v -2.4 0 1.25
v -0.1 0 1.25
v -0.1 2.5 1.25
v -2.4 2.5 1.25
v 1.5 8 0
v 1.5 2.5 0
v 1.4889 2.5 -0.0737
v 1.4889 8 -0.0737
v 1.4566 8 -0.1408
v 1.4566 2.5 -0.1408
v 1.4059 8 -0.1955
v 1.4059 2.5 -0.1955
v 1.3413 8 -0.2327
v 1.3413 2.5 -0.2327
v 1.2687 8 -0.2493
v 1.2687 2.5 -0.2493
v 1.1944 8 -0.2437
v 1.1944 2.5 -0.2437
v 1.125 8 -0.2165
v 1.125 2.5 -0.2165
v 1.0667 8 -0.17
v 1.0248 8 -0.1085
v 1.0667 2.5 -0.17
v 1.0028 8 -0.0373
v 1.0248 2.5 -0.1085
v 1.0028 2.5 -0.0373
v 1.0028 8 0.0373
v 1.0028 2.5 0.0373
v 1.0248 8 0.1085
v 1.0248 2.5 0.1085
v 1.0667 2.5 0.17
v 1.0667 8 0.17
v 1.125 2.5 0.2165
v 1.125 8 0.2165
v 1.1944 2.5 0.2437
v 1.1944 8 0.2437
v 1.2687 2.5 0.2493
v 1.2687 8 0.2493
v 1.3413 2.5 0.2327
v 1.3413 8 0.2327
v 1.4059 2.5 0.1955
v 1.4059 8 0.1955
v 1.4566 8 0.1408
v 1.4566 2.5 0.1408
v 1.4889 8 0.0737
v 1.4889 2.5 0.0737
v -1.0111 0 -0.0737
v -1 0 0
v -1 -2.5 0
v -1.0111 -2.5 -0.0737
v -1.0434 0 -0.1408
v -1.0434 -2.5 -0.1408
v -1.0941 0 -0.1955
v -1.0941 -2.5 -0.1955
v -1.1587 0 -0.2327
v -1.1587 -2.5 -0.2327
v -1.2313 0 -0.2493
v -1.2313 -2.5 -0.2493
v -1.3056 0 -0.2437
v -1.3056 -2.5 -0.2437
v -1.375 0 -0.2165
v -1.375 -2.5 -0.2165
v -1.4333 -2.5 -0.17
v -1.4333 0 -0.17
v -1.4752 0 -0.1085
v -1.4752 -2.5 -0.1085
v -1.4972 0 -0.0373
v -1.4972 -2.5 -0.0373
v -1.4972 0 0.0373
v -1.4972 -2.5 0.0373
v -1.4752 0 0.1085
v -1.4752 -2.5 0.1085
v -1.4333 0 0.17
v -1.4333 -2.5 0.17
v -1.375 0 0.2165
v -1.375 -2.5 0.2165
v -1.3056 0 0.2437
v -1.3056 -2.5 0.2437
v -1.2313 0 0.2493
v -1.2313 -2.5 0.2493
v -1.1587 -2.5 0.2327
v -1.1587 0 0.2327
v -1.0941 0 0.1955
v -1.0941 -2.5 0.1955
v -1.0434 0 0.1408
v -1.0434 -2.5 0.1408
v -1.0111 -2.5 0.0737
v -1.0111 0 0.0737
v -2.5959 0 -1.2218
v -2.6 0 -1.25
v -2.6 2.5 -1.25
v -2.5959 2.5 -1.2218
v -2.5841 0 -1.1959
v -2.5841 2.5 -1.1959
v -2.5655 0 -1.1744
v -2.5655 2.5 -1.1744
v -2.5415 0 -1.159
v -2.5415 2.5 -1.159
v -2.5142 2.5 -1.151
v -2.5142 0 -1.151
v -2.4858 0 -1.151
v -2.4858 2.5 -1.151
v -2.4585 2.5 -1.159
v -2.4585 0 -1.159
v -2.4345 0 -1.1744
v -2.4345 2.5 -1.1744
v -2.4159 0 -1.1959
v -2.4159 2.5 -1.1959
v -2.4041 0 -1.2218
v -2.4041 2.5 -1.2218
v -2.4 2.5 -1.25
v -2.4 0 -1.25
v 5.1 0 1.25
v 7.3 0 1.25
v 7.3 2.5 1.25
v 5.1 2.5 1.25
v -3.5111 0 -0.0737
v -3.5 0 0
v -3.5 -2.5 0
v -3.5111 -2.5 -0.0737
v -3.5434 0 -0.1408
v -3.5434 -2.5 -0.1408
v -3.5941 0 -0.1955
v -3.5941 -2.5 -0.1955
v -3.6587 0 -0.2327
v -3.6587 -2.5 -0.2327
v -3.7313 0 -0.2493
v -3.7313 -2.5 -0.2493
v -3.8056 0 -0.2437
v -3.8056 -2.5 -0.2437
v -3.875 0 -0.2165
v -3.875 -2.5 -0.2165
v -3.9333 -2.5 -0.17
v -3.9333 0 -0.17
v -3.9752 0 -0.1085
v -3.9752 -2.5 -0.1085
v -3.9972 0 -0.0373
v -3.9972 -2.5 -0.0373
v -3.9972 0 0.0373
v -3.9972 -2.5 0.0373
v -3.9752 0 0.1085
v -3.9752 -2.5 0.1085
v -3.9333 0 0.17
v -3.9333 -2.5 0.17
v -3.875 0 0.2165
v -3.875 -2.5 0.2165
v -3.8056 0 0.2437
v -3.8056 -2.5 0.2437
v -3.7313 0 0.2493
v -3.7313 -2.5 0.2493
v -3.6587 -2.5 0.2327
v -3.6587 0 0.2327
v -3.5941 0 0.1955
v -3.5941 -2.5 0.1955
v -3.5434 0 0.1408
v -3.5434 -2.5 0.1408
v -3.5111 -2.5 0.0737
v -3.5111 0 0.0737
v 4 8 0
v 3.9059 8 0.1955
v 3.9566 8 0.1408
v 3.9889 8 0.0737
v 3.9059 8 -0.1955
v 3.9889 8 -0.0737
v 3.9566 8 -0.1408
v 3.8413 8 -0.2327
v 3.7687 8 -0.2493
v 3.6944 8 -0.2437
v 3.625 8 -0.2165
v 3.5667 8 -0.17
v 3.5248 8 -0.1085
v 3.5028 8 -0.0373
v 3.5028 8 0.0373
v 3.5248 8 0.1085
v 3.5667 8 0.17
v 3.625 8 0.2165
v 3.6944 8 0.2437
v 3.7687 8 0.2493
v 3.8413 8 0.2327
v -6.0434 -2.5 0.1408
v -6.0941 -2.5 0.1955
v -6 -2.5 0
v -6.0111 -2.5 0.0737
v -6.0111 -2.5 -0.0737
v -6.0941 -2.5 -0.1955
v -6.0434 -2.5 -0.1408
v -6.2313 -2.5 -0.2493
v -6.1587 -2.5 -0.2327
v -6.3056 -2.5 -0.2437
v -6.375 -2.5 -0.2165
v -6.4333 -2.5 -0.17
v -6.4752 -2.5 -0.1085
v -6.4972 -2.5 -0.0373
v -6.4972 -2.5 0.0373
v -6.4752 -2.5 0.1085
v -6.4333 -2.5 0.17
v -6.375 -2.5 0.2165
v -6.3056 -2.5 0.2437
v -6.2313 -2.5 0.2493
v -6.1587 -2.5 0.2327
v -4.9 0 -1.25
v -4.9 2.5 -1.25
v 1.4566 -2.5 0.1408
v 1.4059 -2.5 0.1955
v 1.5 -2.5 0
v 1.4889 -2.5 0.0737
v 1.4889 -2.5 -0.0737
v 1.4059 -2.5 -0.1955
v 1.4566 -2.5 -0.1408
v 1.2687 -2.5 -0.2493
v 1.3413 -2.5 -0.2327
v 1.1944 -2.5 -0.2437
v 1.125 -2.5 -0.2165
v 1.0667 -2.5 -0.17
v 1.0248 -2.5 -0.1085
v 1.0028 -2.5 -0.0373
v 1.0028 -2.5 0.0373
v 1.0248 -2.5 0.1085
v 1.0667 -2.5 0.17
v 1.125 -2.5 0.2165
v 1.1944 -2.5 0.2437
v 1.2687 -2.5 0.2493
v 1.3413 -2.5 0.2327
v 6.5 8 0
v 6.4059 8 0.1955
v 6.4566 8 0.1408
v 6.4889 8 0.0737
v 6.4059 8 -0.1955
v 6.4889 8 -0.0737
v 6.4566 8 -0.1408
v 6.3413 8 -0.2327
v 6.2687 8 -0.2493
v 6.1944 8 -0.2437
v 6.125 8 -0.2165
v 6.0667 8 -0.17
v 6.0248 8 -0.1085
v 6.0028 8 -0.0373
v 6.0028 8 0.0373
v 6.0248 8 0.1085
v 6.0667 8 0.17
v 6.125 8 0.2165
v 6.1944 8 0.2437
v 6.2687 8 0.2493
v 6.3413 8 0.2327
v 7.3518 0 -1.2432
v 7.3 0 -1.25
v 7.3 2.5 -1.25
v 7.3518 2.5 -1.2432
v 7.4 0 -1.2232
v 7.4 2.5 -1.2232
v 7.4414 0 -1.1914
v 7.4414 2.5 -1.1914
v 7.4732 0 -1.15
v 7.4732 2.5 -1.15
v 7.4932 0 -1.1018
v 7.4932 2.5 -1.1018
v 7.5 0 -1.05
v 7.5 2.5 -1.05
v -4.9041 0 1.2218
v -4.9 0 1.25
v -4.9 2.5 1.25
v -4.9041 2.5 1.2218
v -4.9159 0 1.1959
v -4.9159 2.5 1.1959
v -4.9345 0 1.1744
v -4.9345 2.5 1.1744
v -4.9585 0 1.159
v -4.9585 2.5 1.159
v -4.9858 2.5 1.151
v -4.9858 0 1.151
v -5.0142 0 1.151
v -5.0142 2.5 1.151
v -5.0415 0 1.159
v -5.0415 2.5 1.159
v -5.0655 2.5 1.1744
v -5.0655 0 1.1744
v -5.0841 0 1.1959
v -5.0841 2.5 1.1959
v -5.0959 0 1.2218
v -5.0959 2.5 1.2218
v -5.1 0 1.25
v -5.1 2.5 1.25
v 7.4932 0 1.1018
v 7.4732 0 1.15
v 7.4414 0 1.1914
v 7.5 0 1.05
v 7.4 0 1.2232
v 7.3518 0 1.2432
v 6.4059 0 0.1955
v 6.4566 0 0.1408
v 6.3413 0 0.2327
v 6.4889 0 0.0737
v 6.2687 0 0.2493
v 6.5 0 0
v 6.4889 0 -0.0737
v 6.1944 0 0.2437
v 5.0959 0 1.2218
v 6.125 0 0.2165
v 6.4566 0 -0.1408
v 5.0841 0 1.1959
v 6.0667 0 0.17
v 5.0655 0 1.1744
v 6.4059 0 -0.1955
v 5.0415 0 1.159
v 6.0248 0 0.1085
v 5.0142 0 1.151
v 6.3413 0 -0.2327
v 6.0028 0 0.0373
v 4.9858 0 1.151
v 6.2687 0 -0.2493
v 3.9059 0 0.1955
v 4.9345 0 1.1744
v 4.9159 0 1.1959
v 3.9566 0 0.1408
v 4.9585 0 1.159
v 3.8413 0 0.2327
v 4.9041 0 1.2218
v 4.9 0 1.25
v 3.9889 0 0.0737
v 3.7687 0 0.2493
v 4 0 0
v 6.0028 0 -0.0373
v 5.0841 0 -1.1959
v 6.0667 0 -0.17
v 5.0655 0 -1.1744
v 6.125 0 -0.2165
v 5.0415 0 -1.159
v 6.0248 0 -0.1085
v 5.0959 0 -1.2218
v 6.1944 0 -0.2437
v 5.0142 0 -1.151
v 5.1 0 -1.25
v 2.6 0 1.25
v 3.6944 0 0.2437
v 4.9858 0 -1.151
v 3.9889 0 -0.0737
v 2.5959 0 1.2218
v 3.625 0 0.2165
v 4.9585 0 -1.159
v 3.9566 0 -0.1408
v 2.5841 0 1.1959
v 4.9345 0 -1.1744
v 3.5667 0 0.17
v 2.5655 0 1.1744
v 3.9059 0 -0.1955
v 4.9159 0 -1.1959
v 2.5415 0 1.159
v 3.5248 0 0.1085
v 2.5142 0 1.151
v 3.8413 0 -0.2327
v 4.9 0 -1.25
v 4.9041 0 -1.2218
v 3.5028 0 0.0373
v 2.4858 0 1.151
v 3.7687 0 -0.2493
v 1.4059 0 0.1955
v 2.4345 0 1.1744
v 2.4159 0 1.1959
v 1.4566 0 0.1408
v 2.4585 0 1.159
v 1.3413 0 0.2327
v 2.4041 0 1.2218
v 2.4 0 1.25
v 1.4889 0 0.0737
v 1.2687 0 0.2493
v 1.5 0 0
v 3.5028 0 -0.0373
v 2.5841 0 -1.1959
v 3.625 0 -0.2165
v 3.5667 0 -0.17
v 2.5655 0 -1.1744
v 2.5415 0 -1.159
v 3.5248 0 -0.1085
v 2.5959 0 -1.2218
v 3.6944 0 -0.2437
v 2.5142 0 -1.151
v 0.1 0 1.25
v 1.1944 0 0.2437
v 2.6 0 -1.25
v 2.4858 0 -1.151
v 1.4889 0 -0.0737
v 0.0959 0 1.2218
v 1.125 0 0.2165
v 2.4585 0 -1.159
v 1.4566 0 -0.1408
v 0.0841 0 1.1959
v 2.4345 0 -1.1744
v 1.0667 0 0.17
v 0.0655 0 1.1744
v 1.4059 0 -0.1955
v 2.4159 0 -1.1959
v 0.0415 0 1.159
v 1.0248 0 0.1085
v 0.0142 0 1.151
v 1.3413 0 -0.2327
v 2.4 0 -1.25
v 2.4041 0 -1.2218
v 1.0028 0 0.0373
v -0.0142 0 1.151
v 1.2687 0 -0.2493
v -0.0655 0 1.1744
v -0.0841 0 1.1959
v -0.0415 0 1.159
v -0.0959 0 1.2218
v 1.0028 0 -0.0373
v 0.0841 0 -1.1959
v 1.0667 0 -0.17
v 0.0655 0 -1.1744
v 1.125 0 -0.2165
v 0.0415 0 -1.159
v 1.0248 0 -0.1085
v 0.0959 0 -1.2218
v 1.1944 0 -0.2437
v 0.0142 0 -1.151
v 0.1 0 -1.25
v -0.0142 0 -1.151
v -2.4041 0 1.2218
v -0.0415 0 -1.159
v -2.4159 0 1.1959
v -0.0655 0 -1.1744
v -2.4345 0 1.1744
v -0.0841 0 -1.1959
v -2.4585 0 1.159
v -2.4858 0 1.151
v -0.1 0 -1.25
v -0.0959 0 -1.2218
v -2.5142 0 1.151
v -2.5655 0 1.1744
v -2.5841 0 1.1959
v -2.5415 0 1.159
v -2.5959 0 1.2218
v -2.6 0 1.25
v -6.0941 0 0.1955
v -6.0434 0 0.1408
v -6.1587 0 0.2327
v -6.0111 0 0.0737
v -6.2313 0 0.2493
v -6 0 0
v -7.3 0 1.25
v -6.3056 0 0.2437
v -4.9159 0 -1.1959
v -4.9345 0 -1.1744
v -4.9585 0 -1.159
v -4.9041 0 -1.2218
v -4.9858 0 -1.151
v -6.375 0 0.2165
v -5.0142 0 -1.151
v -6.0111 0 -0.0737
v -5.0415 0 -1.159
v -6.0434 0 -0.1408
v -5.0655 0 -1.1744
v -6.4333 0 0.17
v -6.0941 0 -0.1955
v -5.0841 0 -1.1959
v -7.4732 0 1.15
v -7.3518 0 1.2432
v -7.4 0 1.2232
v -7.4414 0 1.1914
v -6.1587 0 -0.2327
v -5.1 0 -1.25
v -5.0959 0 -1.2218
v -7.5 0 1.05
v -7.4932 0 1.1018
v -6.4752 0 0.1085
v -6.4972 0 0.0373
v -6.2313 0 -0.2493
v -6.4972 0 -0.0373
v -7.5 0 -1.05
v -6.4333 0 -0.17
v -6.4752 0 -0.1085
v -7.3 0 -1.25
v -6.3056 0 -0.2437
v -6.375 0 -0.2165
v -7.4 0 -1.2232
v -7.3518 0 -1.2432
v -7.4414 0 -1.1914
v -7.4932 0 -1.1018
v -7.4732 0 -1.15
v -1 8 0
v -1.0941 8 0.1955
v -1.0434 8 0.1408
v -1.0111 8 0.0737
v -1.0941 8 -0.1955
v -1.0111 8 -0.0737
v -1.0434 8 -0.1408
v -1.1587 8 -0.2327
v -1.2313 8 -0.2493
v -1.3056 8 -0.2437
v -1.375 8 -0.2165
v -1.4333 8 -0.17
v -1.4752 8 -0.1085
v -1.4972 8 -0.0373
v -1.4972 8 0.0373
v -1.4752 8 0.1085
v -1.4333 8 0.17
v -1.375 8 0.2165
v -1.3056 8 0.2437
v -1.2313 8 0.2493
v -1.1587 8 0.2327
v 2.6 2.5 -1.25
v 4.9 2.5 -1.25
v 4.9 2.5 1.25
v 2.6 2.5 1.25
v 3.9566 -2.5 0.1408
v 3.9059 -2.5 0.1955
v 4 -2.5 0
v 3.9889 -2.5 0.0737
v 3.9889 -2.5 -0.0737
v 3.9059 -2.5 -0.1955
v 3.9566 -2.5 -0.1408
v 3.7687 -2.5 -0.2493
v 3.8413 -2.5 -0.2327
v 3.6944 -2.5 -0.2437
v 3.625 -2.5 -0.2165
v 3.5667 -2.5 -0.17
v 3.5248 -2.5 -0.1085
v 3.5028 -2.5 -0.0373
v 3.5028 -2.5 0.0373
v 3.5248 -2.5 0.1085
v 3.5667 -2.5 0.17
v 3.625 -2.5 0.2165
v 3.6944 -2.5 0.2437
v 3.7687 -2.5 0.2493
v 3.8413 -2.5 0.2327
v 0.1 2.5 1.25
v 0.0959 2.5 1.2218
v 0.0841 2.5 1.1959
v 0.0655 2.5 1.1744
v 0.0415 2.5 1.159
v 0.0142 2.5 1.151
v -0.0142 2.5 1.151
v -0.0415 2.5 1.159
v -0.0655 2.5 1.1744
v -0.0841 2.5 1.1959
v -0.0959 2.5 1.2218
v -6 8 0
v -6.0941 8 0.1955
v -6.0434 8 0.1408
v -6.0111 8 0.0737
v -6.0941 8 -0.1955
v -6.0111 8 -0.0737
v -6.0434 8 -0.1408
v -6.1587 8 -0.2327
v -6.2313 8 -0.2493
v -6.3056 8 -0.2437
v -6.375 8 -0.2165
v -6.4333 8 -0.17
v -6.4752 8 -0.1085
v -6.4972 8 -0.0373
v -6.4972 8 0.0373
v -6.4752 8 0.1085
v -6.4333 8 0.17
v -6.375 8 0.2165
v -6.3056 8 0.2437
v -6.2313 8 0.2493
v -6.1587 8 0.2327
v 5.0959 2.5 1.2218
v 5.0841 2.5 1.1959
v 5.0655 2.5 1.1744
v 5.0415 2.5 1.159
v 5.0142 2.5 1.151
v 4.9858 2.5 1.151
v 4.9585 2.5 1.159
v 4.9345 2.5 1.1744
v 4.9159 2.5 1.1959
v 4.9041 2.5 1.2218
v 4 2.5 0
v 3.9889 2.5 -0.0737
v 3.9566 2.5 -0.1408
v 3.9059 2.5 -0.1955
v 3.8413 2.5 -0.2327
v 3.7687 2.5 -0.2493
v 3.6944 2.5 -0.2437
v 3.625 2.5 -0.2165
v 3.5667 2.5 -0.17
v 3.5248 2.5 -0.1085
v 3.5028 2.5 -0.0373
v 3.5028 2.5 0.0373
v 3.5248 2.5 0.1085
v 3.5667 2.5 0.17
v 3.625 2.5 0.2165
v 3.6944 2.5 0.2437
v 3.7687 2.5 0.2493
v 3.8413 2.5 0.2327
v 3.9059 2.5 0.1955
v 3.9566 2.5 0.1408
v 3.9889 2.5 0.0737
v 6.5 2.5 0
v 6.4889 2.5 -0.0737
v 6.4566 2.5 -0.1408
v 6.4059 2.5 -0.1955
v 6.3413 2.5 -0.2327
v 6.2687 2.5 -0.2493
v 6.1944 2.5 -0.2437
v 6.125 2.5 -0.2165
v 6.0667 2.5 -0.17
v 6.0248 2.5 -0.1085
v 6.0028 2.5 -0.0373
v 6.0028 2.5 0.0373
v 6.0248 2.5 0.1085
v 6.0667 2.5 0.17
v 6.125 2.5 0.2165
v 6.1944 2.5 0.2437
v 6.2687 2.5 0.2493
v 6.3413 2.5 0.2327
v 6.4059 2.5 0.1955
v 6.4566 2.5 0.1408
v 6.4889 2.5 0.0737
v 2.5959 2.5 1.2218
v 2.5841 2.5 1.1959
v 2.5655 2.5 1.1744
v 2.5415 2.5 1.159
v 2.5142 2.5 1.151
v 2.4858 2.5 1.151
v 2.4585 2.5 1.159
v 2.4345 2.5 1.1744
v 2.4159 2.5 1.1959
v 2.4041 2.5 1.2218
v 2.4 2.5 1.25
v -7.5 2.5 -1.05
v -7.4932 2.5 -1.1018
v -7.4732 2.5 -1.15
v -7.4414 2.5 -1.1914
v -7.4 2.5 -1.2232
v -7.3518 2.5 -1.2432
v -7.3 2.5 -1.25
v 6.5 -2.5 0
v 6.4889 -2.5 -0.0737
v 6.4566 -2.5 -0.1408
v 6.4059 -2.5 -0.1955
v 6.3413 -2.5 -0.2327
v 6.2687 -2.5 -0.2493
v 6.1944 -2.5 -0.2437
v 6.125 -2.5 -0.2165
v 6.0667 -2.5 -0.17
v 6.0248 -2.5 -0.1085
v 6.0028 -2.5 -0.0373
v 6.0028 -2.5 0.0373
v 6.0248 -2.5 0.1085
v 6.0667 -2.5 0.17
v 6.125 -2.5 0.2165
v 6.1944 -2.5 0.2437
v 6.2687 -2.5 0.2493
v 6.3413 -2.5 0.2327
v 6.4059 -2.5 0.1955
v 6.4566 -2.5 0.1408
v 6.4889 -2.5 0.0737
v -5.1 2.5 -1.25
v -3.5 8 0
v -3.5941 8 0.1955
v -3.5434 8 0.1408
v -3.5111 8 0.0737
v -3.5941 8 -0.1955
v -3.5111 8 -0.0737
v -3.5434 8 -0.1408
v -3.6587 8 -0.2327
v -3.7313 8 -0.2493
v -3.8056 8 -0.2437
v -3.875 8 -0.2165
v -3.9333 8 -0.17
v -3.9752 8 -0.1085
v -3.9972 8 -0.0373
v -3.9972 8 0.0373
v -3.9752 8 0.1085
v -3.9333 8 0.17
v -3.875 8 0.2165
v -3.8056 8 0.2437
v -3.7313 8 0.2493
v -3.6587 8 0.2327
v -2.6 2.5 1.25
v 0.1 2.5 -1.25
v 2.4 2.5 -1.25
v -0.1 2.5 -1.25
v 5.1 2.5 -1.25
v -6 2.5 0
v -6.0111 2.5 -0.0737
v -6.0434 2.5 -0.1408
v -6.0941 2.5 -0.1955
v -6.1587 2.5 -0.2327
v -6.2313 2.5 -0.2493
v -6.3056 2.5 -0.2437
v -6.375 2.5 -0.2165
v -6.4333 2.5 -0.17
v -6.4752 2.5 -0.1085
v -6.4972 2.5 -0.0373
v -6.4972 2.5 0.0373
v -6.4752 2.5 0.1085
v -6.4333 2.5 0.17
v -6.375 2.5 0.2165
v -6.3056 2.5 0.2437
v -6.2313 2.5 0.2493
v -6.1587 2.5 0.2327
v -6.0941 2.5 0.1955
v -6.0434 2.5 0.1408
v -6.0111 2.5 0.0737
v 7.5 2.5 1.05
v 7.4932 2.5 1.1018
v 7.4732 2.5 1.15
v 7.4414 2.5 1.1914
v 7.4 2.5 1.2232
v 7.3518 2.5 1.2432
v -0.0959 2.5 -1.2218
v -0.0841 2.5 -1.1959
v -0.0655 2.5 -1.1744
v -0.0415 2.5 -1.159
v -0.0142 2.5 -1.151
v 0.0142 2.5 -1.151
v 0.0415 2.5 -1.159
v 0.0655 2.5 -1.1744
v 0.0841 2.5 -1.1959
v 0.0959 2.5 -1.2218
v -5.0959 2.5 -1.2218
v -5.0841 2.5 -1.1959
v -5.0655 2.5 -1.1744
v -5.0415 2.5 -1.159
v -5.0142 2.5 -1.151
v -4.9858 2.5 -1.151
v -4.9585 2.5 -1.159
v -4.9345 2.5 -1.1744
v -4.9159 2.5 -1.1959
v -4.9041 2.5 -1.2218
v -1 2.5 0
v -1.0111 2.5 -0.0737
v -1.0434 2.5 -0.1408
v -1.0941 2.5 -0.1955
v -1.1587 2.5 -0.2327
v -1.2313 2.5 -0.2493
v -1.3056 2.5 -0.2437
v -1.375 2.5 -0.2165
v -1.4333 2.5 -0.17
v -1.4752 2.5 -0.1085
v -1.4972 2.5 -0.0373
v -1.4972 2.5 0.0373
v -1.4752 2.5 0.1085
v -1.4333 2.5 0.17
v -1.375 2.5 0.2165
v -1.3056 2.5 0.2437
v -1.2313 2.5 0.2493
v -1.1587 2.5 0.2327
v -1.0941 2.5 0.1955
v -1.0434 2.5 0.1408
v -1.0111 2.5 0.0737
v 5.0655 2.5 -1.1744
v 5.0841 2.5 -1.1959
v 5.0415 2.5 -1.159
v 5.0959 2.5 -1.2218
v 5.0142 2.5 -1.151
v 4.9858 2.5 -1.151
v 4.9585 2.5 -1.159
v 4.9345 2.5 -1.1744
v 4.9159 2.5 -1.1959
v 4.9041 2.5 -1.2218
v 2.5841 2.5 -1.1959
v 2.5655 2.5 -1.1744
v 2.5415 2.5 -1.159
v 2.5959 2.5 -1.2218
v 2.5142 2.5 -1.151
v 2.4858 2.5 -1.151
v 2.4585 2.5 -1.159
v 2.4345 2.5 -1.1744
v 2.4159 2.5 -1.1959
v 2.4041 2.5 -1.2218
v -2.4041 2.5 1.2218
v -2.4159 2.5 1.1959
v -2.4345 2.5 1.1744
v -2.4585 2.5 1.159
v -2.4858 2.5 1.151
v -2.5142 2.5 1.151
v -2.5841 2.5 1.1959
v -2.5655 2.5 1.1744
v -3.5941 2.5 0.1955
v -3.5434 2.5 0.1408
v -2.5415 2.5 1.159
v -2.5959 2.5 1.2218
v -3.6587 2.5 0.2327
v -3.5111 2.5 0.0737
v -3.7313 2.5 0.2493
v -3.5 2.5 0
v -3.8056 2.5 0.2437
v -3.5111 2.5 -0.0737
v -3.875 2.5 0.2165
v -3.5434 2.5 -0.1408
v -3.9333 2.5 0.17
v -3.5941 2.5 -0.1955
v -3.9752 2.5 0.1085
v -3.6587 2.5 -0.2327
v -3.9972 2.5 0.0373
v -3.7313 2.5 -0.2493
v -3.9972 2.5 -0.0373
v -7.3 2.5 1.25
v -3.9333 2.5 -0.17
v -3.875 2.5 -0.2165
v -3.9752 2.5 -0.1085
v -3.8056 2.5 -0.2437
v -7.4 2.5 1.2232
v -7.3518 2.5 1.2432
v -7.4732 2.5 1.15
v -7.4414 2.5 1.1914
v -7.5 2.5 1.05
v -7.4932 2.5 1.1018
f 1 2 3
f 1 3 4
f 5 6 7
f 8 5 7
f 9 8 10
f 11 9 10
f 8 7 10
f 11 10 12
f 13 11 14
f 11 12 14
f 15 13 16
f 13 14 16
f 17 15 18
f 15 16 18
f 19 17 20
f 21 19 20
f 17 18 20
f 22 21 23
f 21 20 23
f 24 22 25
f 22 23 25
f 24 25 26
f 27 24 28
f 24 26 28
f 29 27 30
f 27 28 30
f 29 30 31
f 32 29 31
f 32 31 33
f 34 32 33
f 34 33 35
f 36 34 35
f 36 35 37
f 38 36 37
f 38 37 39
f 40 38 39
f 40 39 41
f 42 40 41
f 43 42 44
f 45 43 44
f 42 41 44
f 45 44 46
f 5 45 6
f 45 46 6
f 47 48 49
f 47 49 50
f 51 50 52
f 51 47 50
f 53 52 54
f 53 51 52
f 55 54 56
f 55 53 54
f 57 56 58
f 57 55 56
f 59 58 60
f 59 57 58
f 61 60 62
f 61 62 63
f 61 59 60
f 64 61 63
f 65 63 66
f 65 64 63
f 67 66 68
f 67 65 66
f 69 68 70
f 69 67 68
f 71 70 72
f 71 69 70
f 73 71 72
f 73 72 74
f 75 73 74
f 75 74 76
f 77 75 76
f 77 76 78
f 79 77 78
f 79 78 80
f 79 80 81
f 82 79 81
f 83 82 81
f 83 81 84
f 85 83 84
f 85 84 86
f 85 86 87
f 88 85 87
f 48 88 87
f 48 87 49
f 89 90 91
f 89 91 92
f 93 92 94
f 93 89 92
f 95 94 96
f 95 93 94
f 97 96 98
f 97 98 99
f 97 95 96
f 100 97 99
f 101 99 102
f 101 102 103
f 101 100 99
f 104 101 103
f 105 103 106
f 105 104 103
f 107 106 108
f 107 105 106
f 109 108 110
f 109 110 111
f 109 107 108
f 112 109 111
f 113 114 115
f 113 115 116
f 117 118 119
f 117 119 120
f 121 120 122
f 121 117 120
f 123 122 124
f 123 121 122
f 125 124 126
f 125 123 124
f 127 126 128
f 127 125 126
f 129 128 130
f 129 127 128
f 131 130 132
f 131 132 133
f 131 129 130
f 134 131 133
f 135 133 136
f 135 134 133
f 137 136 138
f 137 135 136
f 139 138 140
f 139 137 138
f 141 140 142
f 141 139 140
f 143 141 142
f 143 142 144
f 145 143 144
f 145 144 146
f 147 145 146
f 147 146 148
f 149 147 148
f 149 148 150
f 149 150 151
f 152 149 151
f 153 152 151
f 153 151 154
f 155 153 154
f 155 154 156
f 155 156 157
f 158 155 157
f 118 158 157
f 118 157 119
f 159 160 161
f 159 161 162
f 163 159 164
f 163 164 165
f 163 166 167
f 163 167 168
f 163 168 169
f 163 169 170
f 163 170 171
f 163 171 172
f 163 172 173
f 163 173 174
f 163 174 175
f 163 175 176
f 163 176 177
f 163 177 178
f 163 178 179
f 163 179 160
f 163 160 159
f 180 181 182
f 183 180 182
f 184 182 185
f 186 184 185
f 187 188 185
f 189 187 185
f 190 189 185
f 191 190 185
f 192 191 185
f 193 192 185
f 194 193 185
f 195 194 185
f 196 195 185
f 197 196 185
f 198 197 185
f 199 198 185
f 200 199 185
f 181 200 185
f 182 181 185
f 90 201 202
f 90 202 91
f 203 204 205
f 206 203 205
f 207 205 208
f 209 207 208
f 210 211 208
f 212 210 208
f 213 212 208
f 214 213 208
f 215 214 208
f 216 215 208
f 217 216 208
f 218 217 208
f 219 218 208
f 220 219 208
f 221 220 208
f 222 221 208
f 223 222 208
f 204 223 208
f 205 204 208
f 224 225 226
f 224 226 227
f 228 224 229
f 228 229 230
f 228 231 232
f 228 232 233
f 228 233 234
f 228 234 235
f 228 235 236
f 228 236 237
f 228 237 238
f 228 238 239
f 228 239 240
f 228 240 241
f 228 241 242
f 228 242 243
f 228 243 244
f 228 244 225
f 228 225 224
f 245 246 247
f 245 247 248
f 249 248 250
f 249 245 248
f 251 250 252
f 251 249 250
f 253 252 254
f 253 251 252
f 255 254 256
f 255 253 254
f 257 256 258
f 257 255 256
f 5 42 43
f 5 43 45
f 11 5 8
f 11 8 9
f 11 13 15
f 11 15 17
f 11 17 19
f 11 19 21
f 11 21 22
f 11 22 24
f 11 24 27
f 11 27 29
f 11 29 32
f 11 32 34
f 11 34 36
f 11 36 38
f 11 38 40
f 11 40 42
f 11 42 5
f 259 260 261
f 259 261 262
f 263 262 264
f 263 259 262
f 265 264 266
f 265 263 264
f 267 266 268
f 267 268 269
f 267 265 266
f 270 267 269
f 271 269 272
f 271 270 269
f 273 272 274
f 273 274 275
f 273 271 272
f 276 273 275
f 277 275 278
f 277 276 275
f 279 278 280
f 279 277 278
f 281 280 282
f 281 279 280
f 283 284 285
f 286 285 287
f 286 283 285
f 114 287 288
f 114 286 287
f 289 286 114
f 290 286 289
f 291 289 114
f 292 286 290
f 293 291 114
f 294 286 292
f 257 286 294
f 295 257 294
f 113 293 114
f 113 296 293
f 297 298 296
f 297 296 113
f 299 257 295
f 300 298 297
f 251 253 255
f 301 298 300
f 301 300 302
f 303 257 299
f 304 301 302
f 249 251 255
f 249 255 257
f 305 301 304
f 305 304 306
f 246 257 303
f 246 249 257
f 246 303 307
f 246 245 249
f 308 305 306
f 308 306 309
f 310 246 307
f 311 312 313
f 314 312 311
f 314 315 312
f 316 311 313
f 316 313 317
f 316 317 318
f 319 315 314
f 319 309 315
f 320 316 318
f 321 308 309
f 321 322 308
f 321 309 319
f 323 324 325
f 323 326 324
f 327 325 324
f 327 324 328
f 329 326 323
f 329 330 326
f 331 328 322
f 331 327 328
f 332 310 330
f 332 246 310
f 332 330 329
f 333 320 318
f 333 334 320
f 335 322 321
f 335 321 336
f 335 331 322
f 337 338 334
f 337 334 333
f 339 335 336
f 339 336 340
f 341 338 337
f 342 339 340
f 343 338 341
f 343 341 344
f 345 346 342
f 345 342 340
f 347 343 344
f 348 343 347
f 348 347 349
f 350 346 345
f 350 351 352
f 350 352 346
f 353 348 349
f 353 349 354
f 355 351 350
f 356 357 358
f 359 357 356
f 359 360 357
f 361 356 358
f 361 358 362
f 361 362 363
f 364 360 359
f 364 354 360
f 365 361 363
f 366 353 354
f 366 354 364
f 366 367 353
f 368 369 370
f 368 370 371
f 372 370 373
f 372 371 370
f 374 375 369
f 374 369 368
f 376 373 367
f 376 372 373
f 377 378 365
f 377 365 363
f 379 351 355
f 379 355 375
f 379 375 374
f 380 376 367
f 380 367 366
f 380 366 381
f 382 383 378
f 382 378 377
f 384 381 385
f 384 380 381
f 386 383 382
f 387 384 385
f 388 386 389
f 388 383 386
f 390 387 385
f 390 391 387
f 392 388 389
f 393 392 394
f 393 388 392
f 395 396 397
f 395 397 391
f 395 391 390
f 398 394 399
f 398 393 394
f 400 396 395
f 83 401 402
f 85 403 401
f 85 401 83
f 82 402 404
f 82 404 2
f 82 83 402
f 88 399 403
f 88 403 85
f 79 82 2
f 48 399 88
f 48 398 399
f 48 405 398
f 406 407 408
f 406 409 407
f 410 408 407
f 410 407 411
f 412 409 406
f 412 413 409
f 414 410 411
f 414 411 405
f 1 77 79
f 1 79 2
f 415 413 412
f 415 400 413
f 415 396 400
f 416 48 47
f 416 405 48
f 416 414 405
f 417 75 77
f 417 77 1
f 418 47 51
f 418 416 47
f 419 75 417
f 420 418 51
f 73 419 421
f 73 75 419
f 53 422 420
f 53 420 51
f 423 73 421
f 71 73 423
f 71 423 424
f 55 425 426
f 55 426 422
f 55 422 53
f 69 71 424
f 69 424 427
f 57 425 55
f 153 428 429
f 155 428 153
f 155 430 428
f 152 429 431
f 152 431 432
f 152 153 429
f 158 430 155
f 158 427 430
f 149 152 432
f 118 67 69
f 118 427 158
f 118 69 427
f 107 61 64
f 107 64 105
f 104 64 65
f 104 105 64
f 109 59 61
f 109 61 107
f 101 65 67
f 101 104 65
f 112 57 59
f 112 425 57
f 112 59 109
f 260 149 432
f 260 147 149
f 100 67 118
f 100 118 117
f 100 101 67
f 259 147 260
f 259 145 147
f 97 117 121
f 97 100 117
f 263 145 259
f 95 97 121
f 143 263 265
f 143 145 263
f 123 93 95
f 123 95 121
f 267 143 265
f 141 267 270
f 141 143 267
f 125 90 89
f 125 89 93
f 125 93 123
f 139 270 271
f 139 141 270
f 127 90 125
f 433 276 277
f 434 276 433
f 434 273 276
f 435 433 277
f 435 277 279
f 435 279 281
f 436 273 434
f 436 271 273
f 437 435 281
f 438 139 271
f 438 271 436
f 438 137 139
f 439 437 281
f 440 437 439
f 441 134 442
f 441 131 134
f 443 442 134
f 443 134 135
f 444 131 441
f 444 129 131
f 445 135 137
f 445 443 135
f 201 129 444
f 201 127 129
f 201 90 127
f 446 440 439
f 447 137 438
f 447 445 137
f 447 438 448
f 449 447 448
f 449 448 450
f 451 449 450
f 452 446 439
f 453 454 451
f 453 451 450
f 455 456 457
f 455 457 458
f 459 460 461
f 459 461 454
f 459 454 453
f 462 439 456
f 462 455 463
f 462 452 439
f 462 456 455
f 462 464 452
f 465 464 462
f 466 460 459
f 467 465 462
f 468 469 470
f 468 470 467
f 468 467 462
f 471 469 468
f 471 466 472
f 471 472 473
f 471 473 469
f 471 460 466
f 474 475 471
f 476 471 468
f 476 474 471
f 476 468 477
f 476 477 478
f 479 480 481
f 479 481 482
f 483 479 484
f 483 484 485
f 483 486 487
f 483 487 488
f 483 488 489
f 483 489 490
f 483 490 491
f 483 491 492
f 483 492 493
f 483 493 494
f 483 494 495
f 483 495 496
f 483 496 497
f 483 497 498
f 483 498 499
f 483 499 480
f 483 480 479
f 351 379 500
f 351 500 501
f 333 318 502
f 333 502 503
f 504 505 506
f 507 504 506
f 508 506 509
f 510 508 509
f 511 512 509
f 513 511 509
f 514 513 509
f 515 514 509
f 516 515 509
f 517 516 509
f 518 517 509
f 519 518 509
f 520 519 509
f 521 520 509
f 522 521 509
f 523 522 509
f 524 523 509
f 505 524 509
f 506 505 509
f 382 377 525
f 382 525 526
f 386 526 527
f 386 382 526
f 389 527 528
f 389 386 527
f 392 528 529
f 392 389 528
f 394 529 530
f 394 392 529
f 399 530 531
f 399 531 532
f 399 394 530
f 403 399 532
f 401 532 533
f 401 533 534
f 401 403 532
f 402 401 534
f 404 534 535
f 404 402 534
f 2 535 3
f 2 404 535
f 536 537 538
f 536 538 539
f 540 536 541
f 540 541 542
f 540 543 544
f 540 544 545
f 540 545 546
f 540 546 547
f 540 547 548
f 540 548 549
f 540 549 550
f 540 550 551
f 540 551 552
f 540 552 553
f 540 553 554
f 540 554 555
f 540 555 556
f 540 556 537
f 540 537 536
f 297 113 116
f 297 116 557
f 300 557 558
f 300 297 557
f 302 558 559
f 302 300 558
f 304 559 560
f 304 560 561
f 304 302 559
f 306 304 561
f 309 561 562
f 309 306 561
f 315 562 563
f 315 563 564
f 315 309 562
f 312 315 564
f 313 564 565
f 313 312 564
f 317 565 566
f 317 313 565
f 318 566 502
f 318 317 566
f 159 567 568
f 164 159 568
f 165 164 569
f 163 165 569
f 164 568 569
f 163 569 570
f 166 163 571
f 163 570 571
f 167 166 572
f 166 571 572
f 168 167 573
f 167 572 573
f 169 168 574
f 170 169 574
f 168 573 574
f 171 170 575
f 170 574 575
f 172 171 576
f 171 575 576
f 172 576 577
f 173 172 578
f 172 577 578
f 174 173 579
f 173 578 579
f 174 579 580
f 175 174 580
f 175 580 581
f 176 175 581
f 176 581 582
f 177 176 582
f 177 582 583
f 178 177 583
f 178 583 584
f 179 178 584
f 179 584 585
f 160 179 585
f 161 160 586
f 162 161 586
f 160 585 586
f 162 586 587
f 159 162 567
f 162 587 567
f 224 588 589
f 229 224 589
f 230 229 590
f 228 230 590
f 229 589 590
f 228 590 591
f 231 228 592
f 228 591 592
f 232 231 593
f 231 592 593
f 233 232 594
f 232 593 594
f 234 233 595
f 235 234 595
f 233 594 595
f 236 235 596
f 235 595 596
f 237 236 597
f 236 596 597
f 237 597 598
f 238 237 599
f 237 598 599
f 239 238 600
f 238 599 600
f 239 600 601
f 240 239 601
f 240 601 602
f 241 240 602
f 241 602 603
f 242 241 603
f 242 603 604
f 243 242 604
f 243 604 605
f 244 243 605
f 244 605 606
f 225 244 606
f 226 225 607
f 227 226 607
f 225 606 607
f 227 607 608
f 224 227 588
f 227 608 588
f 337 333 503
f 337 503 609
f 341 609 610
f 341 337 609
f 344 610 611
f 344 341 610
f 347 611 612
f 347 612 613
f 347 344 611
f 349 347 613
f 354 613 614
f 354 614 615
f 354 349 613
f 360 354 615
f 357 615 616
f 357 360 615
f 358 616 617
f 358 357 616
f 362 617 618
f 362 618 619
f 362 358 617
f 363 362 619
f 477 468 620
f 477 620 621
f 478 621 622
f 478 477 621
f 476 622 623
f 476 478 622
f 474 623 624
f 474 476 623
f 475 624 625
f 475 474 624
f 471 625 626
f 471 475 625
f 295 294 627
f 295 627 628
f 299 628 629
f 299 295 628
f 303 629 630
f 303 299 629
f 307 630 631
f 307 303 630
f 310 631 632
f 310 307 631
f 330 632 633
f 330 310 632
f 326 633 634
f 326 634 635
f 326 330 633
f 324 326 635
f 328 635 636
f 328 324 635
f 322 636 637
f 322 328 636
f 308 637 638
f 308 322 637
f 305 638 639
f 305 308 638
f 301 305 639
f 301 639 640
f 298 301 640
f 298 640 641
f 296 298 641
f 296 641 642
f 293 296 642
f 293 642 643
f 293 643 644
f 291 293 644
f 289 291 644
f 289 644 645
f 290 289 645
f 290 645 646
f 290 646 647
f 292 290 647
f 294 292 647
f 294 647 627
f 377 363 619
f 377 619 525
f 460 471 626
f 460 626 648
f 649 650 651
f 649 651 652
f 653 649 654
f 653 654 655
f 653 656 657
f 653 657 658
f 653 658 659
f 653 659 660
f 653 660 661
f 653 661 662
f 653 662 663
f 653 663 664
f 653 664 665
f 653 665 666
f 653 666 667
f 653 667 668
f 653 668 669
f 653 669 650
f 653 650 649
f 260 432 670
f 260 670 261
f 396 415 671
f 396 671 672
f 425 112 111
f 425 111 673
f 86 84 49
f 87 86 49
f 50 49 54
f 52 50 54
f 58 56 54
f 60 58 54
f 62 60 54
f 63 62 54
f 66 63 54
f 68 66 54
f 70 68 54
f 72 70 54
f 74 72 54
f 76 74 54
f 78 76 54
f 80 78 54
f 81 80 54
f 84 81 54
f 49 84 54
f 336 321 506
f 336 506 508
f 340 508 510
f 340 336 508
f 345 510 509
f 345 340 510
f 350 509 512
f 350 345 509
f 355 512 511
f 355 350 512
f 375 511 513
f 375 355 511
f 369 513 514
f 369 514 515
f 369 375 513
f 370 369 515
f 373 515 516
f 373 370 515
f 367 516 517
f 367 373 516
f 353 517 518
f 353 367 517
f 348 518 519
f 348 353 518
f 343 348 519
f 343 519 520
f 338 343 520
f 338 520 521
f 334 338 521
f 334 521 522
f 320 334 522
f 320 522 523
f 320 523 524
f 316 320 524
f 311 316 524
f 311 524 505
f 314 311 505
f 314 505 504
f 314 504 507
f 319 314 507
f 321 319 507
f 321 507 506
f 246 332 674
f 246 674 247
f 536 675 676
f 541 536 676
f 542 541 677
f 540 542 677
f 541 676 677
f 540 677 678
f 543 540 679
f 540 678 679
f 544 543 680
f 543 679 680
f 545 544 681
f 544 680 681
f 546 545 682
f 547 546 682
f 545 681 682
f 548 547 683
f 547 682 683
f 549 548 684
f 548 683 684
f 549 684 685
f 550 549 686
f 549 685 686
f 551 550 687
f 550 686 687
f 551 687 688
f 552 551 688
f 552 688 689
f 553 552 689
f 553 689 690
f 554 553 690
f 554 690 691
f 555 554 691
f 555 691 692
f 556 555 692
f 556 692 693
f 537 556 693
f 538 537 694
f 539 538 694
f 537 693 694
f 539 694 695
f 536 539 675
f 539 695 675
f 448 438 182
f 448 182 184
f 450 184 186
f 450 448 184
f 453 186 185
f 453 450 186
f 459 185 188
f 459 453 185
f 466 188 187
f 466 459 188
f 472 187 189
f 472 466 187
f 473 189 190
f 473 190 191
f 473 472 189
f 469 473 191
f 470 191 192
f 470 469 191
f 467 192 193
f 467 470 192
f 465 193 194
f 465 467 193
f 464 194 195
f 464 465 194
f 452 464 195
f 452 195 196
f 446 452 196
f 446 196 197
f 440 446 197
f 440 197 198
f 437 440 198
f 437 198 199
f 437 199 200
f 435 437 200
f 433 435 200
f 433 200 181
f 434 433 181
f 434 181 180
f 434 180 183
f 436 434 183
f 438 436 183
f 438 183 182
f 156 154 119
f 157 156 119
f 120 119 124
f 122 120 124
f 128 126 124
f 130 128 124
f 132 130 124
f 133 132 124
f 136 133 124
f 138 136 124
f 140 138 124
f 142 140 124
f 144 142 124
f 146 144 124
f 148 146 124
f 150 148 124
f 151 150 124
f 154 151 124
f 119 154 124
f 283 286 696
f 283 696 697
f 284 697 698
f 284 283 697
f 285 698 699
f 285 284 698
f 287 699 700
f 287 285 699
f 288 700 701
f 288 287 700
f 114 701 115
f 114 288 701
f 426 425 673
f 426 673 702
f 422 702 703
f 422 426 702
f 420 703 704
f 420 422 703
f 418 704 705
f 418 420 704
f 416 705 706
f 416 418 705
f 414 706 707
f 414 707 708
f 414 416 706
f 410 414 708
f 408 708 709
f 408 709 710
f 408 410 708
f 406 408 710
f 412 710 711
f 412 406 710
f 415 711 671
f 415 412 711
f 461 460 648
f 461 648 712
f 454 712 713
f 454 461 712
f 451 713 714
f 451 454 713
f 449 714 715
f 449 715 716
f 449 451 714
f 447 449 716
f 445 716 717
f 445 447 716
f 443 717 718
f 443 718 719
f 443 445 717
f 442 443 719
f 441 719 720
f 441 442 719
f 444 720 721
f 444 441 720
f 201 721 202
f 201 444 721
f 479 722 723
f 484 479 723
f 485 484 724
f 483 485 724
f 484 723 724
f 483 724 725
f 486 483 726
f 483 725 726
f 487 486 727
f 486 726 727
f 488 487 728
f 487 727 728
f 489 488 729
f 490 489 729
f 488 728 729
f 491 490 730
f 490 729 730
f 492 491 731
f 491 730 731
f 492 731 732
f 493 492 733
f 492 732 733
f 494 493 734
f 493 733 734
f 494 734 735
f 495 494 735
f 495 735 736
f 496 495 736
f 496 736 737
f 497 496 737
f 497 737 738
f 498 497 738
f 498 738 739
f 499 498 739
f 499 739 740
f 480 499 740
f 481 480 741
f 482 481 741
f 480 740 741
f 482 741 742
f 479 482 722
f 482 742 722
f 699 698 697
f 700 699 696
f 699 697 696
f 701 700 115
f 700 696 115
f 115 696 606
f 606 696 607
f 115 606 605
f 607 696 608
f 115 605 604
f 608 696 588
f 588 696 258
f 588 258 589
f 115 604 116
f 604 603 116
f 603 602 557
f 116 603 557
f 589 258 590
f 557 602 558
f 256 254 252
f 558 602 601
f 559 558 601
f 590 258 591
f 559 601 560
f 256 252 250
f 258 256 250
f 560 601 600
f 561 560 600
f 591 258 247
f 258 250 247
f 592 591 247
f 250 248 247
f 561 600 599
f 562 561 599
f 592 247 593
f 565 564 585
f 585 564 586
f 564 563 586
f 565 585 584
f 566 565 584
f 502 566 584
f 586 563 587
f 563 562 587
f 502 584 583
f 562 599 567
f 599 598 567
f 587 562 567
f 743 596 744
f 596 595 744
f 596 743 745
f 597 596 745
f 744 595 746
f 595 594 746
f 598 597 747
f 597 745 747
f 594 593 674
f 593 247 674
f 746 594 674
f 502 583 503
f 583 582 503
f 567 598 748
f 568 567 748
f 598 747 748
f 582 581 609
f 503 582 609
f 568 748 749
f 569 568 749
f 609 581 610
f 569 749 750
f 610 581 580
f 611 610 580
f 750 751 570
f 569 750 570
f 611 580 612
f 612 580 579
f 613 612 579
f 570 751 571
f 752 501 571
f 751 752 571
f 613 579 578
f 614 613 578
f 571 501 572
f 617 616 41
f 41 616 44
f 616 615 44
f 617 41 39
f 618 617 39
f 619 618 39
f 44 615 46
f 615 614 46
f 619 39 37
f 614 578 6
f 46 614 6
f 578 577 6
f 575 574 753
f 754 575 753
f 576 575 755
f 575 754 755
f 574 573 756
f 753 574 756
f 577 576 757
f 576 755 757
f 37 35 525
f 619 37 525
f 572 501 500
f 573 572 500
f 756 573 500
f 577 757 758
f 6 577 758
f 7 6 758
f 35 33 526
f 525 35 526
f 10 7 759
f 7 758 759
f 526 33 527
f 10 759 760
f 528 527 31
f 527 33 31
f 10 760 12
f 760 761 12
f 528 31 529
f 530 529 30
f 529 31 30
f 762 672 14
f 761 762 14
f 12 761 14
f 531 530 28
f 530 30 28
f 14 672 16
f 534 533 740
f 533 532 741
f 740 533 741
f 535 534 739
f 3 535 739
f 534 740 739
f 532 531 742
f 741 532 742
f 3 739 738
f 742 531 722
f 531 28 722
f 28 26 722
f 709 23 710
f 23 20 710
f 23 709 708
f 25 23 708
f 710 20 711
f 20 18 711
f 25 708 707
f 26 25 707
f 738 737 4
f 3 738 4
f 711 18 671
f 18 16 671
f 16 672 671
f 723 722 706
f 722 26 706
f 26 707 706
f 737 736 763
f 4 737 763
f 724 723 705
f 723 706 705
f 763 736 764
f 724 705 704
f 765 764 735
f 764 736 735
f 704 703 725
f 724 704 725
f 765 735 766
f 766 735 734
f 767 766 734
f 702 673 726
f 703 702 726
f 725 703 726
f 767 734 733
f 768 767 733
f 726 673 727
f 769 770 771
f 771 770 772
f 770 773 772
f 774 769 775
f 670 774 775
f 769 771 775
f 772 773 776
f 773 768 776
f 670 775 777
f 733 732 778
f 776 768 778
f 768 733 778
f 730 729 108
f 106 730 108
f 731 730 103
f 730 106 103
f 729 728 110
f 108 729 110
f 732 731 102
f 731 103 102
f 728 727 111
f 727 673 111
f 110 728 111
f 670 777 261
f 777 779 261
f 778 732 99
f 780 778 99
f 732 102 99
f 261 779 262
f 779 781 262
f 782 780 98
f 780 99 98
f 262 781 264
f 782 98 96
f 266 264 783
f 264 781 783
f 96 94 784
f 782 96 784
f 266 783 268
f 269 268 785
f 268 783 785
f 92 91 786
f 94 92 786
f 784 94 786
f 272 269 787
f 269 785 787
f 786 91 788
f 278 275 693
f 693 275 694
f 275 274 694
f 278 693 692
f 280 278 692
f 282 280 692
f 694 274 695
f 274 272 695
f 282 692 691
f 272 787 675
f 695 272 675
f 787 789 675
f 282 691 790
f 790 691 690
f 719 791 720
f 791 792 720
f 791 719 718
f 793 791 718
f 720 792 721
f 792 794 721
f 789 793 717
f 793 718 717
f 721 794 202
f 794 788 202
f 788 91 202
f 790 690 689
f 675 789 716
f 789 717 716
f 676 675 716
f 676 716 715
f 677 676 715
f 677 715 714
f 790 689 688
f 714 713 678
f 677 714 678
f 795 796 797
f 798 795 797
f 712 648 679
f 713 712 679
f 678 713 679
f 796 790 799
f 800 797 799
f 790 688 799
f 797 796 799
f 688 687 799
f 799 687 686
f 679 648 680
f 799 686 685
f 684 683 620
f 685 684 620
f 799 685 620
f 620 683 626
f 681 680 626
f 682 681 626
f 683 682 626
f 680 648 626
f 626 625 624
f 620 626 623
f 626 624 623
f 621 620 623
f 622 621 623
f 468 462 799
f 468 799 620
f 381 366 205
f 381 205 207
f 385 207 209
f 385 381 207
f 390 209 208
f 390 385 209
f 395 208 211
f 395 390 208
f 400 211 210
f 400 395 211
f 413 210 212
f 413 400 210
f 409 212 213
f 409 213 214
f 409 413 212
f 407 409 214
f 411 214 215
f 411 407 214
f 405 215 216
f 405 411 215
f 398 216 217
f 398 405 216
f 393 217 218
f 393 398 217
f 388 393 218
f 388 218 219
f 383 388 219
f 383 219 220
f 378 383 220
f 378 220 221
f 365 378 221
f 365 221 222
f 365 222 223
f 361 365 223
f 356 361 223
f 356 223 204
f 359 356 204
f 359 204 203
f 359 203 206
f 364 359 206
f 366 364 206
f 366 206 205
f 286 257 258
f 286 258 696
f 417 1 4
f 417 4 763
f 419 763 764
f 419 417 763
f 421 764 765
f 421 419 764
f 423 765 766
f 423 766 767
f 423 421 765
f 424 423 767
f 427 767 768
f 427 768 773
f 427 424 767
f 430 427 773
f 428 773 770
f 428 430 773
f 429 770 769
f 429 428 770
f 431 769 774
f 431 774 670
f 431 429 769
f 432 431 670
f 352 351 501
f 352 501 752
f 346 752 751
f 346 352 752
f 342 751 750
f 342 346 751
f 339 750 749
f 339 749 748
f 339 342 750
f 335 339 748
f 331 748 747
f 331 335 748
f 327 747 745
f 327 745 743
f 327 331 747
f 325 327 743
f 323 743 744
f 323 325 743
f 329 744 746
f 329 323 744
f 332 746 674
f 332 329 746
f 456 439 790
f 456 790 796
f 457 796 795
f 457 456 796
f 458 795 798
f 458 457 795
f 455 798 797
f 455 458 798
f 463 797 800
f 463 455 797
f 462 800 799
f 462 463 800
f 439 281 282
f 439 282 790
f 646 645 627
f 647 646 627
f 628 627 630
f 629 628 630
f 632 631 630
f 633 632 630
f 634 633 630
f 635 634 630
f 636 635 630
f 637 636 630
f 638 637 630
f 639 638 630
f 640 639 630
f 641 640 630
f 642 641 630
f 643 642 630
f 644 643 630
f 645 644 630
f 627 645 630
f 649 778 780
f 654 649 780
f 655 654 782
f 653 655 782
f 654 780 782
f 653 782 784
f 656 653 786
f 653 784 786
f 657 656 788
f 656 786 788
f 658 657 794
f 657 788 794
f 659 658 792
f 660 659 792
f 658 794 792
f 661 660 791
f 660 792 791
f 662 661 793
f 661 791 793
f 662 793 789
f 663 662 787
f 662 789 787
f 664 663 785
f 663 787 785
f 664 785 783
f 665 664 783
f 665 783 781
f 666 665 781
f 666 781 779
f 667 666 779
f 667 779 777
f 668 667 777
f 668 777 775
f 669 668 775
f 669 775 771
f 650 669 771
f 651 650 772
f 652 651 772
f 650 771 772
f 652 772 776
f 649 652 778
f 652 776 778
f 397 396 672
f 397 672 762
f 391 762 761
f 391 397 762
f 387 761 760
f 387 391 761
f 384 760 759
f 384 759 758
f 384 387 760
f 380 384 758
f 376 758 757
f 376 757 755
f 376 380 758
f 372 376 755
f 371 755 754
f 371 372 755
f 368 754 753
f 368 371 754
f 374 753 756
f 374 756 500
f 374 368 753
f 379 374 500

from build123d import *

# Parameters (mm, degrees)
IZIM1_R                          = 0.25
Y_KSEKLIK_EKSTR_ZYON1_DEPTH      = 2.5
IZIM2_R                          = 0.25
Y_KSEKLIK_EKSTR_ZYON2_DEPTH      = 5.5
Y_KSEKLIK_EKSTR_ZYON2_DEPTH_BACK = 5


with BuildPart() as part:
    # Çizim1 → Yükseklik-Ekstrüzyon1 (new body)
    with BuildSketch(Plane(origin=(0, 0, 0), x_dir=(1, 0, 0), z_dir=(0, 1, 0))):
        with BuildLine():
            Line((-7.3, 1.25), (-5.1, 1.25))
            ThreePointArc((-5.1, 1.25), (-5, 1.15), (-4.9, 1.25))
            Line((-4.9, 1.25), (-2.6, 1.25))
            ThreePointArc((-2.6, 1.25), (-2.5, 1.15), (-2.4, 1.25))
            Line((-2.4, 1.25), (-0.1, 1.25))
            ThreePointArc((-0.1, 1.25), (0, 1.15), (0.1, 1.25))
            Line((0.1, 1.25), (2.4, 1.25))
            ThreePointArc((2.4, 1.25), (2.5, 1.15), (2.6, 1.25))
            Line((2.6, 1.25), (4.9, 1.25))
            ThreePointArc((4.9, 1.25), (5, 1.15), (5.1, 1.25))
            Line((5.1, 1.25), (7.3, 1.25))
            ThreePointArc((7.3, 1.25), (7.441421356, 1.191421356), (7.5, 1.05))
            Line((7.5, 1.05), (7.5, -1.05))
            ThreePointArc((7.5, -1.05), (7.441421356, -1.191421356), (7.3, -1.25))
            Line((7.3, -1.25), (5.1, -1.25))
            ThreePointArc((5.1, -1.25), (5, -1.15), (4.9, -1.25))
            Line((4.9, -1.25), (2.6, -1.25))
            ThreePointArc((2.6, -1.25), (2.5, -1.15), (2.4, -1.25))
            Line((2.4, -1.25), (0.1, -1.25))
            ThreePointArc((0.1, -1.25), (0, -1.15), (-0.1, -1.25))
            Line((-0.1, -1.25), (-2.4, -1.25))
            ThreePointArc((-2.4, -1.25), (-2.5, -1.15), (-2.6, -1.25))
            Line((-2.6, -1.25), (-4.9, -1.25))
            ThreePointArc((-4.9, -1.25), (-5, -1.15), (-5.1, -1.25))
            Line((-5.1, -1.25), (-7.3, -1.25))
            ThreePointArc((-7.3, -1.25), (-7.441421356, -1.191421356), (-7.5, -1.05))
            Line((-7.5, -1.05), (-7.5, 1.05))
            ThreePointArc((-7.5, 1.05), (-7.441421356, 1.191421356), (-7.3, 1.25))
        make_face()
        with Locations((-1.25, 0)):
            Circle(IZIM1_R, mode=Mode.SUBTRACT)
        with Locations((-3.75, 0)):
            Circle(IZIM1_R, mode=Mode.SUBTRACT)
        with Locations((-6.25, 0)):
            Circle(IZIM1_R, mode=Mode.SUBTRACT)
        with Locations((6.25, 0)):
            Circle(IZIM1_R, mode=Mode.SUBTRACT)
        with Locations((3.75, 0)):
            Circle(IZIM1_R, mode=Mode.SUBTRACT)
        with Locations((1.25, 0)):
            Circle(IZIM1_R, mode=Mode.SUBTRACT)
    extrude(amount=Y_KSEKLIK_EKSTR_ZYON1_DEPTH)

    # Çizim2 → Yükseklik-Ekstrüzyon2 (add, two sides)
    with BuildSketch(Plane(origin=(0, 2.5, 0), x_dir=(1, 0, 0), z_dir=(0, 1, 0))) as y_kseklik_ekstr_zyon2_sk:
        with Locations((-6.25, 0)):
            Circle(IZIM2_R)
        with Locations((-3.75, 0)):
            Circle(IZIM2_R)
        with Locations((-1.25, 0)):
            Circle(IZIM2_R)
        with Locations((1.25, 0)):
            Circle(IZIM2_R)
        with Locations((3.75, 0)):
            Circle(IZIM2_R)
        with Locations((6.25, 0)):
            Circle(IZIM2_R)
    extrude(amount=Y_KSEKLIK_EKSTR_ZYON2_DEPTH)
    extrude(y_kseklik_ekstr_zyon2_sk.sketch, amount=-Y_KSEKLIK_EKSTR_ZYON2_DEPTH_BACK)


solid = part.part
